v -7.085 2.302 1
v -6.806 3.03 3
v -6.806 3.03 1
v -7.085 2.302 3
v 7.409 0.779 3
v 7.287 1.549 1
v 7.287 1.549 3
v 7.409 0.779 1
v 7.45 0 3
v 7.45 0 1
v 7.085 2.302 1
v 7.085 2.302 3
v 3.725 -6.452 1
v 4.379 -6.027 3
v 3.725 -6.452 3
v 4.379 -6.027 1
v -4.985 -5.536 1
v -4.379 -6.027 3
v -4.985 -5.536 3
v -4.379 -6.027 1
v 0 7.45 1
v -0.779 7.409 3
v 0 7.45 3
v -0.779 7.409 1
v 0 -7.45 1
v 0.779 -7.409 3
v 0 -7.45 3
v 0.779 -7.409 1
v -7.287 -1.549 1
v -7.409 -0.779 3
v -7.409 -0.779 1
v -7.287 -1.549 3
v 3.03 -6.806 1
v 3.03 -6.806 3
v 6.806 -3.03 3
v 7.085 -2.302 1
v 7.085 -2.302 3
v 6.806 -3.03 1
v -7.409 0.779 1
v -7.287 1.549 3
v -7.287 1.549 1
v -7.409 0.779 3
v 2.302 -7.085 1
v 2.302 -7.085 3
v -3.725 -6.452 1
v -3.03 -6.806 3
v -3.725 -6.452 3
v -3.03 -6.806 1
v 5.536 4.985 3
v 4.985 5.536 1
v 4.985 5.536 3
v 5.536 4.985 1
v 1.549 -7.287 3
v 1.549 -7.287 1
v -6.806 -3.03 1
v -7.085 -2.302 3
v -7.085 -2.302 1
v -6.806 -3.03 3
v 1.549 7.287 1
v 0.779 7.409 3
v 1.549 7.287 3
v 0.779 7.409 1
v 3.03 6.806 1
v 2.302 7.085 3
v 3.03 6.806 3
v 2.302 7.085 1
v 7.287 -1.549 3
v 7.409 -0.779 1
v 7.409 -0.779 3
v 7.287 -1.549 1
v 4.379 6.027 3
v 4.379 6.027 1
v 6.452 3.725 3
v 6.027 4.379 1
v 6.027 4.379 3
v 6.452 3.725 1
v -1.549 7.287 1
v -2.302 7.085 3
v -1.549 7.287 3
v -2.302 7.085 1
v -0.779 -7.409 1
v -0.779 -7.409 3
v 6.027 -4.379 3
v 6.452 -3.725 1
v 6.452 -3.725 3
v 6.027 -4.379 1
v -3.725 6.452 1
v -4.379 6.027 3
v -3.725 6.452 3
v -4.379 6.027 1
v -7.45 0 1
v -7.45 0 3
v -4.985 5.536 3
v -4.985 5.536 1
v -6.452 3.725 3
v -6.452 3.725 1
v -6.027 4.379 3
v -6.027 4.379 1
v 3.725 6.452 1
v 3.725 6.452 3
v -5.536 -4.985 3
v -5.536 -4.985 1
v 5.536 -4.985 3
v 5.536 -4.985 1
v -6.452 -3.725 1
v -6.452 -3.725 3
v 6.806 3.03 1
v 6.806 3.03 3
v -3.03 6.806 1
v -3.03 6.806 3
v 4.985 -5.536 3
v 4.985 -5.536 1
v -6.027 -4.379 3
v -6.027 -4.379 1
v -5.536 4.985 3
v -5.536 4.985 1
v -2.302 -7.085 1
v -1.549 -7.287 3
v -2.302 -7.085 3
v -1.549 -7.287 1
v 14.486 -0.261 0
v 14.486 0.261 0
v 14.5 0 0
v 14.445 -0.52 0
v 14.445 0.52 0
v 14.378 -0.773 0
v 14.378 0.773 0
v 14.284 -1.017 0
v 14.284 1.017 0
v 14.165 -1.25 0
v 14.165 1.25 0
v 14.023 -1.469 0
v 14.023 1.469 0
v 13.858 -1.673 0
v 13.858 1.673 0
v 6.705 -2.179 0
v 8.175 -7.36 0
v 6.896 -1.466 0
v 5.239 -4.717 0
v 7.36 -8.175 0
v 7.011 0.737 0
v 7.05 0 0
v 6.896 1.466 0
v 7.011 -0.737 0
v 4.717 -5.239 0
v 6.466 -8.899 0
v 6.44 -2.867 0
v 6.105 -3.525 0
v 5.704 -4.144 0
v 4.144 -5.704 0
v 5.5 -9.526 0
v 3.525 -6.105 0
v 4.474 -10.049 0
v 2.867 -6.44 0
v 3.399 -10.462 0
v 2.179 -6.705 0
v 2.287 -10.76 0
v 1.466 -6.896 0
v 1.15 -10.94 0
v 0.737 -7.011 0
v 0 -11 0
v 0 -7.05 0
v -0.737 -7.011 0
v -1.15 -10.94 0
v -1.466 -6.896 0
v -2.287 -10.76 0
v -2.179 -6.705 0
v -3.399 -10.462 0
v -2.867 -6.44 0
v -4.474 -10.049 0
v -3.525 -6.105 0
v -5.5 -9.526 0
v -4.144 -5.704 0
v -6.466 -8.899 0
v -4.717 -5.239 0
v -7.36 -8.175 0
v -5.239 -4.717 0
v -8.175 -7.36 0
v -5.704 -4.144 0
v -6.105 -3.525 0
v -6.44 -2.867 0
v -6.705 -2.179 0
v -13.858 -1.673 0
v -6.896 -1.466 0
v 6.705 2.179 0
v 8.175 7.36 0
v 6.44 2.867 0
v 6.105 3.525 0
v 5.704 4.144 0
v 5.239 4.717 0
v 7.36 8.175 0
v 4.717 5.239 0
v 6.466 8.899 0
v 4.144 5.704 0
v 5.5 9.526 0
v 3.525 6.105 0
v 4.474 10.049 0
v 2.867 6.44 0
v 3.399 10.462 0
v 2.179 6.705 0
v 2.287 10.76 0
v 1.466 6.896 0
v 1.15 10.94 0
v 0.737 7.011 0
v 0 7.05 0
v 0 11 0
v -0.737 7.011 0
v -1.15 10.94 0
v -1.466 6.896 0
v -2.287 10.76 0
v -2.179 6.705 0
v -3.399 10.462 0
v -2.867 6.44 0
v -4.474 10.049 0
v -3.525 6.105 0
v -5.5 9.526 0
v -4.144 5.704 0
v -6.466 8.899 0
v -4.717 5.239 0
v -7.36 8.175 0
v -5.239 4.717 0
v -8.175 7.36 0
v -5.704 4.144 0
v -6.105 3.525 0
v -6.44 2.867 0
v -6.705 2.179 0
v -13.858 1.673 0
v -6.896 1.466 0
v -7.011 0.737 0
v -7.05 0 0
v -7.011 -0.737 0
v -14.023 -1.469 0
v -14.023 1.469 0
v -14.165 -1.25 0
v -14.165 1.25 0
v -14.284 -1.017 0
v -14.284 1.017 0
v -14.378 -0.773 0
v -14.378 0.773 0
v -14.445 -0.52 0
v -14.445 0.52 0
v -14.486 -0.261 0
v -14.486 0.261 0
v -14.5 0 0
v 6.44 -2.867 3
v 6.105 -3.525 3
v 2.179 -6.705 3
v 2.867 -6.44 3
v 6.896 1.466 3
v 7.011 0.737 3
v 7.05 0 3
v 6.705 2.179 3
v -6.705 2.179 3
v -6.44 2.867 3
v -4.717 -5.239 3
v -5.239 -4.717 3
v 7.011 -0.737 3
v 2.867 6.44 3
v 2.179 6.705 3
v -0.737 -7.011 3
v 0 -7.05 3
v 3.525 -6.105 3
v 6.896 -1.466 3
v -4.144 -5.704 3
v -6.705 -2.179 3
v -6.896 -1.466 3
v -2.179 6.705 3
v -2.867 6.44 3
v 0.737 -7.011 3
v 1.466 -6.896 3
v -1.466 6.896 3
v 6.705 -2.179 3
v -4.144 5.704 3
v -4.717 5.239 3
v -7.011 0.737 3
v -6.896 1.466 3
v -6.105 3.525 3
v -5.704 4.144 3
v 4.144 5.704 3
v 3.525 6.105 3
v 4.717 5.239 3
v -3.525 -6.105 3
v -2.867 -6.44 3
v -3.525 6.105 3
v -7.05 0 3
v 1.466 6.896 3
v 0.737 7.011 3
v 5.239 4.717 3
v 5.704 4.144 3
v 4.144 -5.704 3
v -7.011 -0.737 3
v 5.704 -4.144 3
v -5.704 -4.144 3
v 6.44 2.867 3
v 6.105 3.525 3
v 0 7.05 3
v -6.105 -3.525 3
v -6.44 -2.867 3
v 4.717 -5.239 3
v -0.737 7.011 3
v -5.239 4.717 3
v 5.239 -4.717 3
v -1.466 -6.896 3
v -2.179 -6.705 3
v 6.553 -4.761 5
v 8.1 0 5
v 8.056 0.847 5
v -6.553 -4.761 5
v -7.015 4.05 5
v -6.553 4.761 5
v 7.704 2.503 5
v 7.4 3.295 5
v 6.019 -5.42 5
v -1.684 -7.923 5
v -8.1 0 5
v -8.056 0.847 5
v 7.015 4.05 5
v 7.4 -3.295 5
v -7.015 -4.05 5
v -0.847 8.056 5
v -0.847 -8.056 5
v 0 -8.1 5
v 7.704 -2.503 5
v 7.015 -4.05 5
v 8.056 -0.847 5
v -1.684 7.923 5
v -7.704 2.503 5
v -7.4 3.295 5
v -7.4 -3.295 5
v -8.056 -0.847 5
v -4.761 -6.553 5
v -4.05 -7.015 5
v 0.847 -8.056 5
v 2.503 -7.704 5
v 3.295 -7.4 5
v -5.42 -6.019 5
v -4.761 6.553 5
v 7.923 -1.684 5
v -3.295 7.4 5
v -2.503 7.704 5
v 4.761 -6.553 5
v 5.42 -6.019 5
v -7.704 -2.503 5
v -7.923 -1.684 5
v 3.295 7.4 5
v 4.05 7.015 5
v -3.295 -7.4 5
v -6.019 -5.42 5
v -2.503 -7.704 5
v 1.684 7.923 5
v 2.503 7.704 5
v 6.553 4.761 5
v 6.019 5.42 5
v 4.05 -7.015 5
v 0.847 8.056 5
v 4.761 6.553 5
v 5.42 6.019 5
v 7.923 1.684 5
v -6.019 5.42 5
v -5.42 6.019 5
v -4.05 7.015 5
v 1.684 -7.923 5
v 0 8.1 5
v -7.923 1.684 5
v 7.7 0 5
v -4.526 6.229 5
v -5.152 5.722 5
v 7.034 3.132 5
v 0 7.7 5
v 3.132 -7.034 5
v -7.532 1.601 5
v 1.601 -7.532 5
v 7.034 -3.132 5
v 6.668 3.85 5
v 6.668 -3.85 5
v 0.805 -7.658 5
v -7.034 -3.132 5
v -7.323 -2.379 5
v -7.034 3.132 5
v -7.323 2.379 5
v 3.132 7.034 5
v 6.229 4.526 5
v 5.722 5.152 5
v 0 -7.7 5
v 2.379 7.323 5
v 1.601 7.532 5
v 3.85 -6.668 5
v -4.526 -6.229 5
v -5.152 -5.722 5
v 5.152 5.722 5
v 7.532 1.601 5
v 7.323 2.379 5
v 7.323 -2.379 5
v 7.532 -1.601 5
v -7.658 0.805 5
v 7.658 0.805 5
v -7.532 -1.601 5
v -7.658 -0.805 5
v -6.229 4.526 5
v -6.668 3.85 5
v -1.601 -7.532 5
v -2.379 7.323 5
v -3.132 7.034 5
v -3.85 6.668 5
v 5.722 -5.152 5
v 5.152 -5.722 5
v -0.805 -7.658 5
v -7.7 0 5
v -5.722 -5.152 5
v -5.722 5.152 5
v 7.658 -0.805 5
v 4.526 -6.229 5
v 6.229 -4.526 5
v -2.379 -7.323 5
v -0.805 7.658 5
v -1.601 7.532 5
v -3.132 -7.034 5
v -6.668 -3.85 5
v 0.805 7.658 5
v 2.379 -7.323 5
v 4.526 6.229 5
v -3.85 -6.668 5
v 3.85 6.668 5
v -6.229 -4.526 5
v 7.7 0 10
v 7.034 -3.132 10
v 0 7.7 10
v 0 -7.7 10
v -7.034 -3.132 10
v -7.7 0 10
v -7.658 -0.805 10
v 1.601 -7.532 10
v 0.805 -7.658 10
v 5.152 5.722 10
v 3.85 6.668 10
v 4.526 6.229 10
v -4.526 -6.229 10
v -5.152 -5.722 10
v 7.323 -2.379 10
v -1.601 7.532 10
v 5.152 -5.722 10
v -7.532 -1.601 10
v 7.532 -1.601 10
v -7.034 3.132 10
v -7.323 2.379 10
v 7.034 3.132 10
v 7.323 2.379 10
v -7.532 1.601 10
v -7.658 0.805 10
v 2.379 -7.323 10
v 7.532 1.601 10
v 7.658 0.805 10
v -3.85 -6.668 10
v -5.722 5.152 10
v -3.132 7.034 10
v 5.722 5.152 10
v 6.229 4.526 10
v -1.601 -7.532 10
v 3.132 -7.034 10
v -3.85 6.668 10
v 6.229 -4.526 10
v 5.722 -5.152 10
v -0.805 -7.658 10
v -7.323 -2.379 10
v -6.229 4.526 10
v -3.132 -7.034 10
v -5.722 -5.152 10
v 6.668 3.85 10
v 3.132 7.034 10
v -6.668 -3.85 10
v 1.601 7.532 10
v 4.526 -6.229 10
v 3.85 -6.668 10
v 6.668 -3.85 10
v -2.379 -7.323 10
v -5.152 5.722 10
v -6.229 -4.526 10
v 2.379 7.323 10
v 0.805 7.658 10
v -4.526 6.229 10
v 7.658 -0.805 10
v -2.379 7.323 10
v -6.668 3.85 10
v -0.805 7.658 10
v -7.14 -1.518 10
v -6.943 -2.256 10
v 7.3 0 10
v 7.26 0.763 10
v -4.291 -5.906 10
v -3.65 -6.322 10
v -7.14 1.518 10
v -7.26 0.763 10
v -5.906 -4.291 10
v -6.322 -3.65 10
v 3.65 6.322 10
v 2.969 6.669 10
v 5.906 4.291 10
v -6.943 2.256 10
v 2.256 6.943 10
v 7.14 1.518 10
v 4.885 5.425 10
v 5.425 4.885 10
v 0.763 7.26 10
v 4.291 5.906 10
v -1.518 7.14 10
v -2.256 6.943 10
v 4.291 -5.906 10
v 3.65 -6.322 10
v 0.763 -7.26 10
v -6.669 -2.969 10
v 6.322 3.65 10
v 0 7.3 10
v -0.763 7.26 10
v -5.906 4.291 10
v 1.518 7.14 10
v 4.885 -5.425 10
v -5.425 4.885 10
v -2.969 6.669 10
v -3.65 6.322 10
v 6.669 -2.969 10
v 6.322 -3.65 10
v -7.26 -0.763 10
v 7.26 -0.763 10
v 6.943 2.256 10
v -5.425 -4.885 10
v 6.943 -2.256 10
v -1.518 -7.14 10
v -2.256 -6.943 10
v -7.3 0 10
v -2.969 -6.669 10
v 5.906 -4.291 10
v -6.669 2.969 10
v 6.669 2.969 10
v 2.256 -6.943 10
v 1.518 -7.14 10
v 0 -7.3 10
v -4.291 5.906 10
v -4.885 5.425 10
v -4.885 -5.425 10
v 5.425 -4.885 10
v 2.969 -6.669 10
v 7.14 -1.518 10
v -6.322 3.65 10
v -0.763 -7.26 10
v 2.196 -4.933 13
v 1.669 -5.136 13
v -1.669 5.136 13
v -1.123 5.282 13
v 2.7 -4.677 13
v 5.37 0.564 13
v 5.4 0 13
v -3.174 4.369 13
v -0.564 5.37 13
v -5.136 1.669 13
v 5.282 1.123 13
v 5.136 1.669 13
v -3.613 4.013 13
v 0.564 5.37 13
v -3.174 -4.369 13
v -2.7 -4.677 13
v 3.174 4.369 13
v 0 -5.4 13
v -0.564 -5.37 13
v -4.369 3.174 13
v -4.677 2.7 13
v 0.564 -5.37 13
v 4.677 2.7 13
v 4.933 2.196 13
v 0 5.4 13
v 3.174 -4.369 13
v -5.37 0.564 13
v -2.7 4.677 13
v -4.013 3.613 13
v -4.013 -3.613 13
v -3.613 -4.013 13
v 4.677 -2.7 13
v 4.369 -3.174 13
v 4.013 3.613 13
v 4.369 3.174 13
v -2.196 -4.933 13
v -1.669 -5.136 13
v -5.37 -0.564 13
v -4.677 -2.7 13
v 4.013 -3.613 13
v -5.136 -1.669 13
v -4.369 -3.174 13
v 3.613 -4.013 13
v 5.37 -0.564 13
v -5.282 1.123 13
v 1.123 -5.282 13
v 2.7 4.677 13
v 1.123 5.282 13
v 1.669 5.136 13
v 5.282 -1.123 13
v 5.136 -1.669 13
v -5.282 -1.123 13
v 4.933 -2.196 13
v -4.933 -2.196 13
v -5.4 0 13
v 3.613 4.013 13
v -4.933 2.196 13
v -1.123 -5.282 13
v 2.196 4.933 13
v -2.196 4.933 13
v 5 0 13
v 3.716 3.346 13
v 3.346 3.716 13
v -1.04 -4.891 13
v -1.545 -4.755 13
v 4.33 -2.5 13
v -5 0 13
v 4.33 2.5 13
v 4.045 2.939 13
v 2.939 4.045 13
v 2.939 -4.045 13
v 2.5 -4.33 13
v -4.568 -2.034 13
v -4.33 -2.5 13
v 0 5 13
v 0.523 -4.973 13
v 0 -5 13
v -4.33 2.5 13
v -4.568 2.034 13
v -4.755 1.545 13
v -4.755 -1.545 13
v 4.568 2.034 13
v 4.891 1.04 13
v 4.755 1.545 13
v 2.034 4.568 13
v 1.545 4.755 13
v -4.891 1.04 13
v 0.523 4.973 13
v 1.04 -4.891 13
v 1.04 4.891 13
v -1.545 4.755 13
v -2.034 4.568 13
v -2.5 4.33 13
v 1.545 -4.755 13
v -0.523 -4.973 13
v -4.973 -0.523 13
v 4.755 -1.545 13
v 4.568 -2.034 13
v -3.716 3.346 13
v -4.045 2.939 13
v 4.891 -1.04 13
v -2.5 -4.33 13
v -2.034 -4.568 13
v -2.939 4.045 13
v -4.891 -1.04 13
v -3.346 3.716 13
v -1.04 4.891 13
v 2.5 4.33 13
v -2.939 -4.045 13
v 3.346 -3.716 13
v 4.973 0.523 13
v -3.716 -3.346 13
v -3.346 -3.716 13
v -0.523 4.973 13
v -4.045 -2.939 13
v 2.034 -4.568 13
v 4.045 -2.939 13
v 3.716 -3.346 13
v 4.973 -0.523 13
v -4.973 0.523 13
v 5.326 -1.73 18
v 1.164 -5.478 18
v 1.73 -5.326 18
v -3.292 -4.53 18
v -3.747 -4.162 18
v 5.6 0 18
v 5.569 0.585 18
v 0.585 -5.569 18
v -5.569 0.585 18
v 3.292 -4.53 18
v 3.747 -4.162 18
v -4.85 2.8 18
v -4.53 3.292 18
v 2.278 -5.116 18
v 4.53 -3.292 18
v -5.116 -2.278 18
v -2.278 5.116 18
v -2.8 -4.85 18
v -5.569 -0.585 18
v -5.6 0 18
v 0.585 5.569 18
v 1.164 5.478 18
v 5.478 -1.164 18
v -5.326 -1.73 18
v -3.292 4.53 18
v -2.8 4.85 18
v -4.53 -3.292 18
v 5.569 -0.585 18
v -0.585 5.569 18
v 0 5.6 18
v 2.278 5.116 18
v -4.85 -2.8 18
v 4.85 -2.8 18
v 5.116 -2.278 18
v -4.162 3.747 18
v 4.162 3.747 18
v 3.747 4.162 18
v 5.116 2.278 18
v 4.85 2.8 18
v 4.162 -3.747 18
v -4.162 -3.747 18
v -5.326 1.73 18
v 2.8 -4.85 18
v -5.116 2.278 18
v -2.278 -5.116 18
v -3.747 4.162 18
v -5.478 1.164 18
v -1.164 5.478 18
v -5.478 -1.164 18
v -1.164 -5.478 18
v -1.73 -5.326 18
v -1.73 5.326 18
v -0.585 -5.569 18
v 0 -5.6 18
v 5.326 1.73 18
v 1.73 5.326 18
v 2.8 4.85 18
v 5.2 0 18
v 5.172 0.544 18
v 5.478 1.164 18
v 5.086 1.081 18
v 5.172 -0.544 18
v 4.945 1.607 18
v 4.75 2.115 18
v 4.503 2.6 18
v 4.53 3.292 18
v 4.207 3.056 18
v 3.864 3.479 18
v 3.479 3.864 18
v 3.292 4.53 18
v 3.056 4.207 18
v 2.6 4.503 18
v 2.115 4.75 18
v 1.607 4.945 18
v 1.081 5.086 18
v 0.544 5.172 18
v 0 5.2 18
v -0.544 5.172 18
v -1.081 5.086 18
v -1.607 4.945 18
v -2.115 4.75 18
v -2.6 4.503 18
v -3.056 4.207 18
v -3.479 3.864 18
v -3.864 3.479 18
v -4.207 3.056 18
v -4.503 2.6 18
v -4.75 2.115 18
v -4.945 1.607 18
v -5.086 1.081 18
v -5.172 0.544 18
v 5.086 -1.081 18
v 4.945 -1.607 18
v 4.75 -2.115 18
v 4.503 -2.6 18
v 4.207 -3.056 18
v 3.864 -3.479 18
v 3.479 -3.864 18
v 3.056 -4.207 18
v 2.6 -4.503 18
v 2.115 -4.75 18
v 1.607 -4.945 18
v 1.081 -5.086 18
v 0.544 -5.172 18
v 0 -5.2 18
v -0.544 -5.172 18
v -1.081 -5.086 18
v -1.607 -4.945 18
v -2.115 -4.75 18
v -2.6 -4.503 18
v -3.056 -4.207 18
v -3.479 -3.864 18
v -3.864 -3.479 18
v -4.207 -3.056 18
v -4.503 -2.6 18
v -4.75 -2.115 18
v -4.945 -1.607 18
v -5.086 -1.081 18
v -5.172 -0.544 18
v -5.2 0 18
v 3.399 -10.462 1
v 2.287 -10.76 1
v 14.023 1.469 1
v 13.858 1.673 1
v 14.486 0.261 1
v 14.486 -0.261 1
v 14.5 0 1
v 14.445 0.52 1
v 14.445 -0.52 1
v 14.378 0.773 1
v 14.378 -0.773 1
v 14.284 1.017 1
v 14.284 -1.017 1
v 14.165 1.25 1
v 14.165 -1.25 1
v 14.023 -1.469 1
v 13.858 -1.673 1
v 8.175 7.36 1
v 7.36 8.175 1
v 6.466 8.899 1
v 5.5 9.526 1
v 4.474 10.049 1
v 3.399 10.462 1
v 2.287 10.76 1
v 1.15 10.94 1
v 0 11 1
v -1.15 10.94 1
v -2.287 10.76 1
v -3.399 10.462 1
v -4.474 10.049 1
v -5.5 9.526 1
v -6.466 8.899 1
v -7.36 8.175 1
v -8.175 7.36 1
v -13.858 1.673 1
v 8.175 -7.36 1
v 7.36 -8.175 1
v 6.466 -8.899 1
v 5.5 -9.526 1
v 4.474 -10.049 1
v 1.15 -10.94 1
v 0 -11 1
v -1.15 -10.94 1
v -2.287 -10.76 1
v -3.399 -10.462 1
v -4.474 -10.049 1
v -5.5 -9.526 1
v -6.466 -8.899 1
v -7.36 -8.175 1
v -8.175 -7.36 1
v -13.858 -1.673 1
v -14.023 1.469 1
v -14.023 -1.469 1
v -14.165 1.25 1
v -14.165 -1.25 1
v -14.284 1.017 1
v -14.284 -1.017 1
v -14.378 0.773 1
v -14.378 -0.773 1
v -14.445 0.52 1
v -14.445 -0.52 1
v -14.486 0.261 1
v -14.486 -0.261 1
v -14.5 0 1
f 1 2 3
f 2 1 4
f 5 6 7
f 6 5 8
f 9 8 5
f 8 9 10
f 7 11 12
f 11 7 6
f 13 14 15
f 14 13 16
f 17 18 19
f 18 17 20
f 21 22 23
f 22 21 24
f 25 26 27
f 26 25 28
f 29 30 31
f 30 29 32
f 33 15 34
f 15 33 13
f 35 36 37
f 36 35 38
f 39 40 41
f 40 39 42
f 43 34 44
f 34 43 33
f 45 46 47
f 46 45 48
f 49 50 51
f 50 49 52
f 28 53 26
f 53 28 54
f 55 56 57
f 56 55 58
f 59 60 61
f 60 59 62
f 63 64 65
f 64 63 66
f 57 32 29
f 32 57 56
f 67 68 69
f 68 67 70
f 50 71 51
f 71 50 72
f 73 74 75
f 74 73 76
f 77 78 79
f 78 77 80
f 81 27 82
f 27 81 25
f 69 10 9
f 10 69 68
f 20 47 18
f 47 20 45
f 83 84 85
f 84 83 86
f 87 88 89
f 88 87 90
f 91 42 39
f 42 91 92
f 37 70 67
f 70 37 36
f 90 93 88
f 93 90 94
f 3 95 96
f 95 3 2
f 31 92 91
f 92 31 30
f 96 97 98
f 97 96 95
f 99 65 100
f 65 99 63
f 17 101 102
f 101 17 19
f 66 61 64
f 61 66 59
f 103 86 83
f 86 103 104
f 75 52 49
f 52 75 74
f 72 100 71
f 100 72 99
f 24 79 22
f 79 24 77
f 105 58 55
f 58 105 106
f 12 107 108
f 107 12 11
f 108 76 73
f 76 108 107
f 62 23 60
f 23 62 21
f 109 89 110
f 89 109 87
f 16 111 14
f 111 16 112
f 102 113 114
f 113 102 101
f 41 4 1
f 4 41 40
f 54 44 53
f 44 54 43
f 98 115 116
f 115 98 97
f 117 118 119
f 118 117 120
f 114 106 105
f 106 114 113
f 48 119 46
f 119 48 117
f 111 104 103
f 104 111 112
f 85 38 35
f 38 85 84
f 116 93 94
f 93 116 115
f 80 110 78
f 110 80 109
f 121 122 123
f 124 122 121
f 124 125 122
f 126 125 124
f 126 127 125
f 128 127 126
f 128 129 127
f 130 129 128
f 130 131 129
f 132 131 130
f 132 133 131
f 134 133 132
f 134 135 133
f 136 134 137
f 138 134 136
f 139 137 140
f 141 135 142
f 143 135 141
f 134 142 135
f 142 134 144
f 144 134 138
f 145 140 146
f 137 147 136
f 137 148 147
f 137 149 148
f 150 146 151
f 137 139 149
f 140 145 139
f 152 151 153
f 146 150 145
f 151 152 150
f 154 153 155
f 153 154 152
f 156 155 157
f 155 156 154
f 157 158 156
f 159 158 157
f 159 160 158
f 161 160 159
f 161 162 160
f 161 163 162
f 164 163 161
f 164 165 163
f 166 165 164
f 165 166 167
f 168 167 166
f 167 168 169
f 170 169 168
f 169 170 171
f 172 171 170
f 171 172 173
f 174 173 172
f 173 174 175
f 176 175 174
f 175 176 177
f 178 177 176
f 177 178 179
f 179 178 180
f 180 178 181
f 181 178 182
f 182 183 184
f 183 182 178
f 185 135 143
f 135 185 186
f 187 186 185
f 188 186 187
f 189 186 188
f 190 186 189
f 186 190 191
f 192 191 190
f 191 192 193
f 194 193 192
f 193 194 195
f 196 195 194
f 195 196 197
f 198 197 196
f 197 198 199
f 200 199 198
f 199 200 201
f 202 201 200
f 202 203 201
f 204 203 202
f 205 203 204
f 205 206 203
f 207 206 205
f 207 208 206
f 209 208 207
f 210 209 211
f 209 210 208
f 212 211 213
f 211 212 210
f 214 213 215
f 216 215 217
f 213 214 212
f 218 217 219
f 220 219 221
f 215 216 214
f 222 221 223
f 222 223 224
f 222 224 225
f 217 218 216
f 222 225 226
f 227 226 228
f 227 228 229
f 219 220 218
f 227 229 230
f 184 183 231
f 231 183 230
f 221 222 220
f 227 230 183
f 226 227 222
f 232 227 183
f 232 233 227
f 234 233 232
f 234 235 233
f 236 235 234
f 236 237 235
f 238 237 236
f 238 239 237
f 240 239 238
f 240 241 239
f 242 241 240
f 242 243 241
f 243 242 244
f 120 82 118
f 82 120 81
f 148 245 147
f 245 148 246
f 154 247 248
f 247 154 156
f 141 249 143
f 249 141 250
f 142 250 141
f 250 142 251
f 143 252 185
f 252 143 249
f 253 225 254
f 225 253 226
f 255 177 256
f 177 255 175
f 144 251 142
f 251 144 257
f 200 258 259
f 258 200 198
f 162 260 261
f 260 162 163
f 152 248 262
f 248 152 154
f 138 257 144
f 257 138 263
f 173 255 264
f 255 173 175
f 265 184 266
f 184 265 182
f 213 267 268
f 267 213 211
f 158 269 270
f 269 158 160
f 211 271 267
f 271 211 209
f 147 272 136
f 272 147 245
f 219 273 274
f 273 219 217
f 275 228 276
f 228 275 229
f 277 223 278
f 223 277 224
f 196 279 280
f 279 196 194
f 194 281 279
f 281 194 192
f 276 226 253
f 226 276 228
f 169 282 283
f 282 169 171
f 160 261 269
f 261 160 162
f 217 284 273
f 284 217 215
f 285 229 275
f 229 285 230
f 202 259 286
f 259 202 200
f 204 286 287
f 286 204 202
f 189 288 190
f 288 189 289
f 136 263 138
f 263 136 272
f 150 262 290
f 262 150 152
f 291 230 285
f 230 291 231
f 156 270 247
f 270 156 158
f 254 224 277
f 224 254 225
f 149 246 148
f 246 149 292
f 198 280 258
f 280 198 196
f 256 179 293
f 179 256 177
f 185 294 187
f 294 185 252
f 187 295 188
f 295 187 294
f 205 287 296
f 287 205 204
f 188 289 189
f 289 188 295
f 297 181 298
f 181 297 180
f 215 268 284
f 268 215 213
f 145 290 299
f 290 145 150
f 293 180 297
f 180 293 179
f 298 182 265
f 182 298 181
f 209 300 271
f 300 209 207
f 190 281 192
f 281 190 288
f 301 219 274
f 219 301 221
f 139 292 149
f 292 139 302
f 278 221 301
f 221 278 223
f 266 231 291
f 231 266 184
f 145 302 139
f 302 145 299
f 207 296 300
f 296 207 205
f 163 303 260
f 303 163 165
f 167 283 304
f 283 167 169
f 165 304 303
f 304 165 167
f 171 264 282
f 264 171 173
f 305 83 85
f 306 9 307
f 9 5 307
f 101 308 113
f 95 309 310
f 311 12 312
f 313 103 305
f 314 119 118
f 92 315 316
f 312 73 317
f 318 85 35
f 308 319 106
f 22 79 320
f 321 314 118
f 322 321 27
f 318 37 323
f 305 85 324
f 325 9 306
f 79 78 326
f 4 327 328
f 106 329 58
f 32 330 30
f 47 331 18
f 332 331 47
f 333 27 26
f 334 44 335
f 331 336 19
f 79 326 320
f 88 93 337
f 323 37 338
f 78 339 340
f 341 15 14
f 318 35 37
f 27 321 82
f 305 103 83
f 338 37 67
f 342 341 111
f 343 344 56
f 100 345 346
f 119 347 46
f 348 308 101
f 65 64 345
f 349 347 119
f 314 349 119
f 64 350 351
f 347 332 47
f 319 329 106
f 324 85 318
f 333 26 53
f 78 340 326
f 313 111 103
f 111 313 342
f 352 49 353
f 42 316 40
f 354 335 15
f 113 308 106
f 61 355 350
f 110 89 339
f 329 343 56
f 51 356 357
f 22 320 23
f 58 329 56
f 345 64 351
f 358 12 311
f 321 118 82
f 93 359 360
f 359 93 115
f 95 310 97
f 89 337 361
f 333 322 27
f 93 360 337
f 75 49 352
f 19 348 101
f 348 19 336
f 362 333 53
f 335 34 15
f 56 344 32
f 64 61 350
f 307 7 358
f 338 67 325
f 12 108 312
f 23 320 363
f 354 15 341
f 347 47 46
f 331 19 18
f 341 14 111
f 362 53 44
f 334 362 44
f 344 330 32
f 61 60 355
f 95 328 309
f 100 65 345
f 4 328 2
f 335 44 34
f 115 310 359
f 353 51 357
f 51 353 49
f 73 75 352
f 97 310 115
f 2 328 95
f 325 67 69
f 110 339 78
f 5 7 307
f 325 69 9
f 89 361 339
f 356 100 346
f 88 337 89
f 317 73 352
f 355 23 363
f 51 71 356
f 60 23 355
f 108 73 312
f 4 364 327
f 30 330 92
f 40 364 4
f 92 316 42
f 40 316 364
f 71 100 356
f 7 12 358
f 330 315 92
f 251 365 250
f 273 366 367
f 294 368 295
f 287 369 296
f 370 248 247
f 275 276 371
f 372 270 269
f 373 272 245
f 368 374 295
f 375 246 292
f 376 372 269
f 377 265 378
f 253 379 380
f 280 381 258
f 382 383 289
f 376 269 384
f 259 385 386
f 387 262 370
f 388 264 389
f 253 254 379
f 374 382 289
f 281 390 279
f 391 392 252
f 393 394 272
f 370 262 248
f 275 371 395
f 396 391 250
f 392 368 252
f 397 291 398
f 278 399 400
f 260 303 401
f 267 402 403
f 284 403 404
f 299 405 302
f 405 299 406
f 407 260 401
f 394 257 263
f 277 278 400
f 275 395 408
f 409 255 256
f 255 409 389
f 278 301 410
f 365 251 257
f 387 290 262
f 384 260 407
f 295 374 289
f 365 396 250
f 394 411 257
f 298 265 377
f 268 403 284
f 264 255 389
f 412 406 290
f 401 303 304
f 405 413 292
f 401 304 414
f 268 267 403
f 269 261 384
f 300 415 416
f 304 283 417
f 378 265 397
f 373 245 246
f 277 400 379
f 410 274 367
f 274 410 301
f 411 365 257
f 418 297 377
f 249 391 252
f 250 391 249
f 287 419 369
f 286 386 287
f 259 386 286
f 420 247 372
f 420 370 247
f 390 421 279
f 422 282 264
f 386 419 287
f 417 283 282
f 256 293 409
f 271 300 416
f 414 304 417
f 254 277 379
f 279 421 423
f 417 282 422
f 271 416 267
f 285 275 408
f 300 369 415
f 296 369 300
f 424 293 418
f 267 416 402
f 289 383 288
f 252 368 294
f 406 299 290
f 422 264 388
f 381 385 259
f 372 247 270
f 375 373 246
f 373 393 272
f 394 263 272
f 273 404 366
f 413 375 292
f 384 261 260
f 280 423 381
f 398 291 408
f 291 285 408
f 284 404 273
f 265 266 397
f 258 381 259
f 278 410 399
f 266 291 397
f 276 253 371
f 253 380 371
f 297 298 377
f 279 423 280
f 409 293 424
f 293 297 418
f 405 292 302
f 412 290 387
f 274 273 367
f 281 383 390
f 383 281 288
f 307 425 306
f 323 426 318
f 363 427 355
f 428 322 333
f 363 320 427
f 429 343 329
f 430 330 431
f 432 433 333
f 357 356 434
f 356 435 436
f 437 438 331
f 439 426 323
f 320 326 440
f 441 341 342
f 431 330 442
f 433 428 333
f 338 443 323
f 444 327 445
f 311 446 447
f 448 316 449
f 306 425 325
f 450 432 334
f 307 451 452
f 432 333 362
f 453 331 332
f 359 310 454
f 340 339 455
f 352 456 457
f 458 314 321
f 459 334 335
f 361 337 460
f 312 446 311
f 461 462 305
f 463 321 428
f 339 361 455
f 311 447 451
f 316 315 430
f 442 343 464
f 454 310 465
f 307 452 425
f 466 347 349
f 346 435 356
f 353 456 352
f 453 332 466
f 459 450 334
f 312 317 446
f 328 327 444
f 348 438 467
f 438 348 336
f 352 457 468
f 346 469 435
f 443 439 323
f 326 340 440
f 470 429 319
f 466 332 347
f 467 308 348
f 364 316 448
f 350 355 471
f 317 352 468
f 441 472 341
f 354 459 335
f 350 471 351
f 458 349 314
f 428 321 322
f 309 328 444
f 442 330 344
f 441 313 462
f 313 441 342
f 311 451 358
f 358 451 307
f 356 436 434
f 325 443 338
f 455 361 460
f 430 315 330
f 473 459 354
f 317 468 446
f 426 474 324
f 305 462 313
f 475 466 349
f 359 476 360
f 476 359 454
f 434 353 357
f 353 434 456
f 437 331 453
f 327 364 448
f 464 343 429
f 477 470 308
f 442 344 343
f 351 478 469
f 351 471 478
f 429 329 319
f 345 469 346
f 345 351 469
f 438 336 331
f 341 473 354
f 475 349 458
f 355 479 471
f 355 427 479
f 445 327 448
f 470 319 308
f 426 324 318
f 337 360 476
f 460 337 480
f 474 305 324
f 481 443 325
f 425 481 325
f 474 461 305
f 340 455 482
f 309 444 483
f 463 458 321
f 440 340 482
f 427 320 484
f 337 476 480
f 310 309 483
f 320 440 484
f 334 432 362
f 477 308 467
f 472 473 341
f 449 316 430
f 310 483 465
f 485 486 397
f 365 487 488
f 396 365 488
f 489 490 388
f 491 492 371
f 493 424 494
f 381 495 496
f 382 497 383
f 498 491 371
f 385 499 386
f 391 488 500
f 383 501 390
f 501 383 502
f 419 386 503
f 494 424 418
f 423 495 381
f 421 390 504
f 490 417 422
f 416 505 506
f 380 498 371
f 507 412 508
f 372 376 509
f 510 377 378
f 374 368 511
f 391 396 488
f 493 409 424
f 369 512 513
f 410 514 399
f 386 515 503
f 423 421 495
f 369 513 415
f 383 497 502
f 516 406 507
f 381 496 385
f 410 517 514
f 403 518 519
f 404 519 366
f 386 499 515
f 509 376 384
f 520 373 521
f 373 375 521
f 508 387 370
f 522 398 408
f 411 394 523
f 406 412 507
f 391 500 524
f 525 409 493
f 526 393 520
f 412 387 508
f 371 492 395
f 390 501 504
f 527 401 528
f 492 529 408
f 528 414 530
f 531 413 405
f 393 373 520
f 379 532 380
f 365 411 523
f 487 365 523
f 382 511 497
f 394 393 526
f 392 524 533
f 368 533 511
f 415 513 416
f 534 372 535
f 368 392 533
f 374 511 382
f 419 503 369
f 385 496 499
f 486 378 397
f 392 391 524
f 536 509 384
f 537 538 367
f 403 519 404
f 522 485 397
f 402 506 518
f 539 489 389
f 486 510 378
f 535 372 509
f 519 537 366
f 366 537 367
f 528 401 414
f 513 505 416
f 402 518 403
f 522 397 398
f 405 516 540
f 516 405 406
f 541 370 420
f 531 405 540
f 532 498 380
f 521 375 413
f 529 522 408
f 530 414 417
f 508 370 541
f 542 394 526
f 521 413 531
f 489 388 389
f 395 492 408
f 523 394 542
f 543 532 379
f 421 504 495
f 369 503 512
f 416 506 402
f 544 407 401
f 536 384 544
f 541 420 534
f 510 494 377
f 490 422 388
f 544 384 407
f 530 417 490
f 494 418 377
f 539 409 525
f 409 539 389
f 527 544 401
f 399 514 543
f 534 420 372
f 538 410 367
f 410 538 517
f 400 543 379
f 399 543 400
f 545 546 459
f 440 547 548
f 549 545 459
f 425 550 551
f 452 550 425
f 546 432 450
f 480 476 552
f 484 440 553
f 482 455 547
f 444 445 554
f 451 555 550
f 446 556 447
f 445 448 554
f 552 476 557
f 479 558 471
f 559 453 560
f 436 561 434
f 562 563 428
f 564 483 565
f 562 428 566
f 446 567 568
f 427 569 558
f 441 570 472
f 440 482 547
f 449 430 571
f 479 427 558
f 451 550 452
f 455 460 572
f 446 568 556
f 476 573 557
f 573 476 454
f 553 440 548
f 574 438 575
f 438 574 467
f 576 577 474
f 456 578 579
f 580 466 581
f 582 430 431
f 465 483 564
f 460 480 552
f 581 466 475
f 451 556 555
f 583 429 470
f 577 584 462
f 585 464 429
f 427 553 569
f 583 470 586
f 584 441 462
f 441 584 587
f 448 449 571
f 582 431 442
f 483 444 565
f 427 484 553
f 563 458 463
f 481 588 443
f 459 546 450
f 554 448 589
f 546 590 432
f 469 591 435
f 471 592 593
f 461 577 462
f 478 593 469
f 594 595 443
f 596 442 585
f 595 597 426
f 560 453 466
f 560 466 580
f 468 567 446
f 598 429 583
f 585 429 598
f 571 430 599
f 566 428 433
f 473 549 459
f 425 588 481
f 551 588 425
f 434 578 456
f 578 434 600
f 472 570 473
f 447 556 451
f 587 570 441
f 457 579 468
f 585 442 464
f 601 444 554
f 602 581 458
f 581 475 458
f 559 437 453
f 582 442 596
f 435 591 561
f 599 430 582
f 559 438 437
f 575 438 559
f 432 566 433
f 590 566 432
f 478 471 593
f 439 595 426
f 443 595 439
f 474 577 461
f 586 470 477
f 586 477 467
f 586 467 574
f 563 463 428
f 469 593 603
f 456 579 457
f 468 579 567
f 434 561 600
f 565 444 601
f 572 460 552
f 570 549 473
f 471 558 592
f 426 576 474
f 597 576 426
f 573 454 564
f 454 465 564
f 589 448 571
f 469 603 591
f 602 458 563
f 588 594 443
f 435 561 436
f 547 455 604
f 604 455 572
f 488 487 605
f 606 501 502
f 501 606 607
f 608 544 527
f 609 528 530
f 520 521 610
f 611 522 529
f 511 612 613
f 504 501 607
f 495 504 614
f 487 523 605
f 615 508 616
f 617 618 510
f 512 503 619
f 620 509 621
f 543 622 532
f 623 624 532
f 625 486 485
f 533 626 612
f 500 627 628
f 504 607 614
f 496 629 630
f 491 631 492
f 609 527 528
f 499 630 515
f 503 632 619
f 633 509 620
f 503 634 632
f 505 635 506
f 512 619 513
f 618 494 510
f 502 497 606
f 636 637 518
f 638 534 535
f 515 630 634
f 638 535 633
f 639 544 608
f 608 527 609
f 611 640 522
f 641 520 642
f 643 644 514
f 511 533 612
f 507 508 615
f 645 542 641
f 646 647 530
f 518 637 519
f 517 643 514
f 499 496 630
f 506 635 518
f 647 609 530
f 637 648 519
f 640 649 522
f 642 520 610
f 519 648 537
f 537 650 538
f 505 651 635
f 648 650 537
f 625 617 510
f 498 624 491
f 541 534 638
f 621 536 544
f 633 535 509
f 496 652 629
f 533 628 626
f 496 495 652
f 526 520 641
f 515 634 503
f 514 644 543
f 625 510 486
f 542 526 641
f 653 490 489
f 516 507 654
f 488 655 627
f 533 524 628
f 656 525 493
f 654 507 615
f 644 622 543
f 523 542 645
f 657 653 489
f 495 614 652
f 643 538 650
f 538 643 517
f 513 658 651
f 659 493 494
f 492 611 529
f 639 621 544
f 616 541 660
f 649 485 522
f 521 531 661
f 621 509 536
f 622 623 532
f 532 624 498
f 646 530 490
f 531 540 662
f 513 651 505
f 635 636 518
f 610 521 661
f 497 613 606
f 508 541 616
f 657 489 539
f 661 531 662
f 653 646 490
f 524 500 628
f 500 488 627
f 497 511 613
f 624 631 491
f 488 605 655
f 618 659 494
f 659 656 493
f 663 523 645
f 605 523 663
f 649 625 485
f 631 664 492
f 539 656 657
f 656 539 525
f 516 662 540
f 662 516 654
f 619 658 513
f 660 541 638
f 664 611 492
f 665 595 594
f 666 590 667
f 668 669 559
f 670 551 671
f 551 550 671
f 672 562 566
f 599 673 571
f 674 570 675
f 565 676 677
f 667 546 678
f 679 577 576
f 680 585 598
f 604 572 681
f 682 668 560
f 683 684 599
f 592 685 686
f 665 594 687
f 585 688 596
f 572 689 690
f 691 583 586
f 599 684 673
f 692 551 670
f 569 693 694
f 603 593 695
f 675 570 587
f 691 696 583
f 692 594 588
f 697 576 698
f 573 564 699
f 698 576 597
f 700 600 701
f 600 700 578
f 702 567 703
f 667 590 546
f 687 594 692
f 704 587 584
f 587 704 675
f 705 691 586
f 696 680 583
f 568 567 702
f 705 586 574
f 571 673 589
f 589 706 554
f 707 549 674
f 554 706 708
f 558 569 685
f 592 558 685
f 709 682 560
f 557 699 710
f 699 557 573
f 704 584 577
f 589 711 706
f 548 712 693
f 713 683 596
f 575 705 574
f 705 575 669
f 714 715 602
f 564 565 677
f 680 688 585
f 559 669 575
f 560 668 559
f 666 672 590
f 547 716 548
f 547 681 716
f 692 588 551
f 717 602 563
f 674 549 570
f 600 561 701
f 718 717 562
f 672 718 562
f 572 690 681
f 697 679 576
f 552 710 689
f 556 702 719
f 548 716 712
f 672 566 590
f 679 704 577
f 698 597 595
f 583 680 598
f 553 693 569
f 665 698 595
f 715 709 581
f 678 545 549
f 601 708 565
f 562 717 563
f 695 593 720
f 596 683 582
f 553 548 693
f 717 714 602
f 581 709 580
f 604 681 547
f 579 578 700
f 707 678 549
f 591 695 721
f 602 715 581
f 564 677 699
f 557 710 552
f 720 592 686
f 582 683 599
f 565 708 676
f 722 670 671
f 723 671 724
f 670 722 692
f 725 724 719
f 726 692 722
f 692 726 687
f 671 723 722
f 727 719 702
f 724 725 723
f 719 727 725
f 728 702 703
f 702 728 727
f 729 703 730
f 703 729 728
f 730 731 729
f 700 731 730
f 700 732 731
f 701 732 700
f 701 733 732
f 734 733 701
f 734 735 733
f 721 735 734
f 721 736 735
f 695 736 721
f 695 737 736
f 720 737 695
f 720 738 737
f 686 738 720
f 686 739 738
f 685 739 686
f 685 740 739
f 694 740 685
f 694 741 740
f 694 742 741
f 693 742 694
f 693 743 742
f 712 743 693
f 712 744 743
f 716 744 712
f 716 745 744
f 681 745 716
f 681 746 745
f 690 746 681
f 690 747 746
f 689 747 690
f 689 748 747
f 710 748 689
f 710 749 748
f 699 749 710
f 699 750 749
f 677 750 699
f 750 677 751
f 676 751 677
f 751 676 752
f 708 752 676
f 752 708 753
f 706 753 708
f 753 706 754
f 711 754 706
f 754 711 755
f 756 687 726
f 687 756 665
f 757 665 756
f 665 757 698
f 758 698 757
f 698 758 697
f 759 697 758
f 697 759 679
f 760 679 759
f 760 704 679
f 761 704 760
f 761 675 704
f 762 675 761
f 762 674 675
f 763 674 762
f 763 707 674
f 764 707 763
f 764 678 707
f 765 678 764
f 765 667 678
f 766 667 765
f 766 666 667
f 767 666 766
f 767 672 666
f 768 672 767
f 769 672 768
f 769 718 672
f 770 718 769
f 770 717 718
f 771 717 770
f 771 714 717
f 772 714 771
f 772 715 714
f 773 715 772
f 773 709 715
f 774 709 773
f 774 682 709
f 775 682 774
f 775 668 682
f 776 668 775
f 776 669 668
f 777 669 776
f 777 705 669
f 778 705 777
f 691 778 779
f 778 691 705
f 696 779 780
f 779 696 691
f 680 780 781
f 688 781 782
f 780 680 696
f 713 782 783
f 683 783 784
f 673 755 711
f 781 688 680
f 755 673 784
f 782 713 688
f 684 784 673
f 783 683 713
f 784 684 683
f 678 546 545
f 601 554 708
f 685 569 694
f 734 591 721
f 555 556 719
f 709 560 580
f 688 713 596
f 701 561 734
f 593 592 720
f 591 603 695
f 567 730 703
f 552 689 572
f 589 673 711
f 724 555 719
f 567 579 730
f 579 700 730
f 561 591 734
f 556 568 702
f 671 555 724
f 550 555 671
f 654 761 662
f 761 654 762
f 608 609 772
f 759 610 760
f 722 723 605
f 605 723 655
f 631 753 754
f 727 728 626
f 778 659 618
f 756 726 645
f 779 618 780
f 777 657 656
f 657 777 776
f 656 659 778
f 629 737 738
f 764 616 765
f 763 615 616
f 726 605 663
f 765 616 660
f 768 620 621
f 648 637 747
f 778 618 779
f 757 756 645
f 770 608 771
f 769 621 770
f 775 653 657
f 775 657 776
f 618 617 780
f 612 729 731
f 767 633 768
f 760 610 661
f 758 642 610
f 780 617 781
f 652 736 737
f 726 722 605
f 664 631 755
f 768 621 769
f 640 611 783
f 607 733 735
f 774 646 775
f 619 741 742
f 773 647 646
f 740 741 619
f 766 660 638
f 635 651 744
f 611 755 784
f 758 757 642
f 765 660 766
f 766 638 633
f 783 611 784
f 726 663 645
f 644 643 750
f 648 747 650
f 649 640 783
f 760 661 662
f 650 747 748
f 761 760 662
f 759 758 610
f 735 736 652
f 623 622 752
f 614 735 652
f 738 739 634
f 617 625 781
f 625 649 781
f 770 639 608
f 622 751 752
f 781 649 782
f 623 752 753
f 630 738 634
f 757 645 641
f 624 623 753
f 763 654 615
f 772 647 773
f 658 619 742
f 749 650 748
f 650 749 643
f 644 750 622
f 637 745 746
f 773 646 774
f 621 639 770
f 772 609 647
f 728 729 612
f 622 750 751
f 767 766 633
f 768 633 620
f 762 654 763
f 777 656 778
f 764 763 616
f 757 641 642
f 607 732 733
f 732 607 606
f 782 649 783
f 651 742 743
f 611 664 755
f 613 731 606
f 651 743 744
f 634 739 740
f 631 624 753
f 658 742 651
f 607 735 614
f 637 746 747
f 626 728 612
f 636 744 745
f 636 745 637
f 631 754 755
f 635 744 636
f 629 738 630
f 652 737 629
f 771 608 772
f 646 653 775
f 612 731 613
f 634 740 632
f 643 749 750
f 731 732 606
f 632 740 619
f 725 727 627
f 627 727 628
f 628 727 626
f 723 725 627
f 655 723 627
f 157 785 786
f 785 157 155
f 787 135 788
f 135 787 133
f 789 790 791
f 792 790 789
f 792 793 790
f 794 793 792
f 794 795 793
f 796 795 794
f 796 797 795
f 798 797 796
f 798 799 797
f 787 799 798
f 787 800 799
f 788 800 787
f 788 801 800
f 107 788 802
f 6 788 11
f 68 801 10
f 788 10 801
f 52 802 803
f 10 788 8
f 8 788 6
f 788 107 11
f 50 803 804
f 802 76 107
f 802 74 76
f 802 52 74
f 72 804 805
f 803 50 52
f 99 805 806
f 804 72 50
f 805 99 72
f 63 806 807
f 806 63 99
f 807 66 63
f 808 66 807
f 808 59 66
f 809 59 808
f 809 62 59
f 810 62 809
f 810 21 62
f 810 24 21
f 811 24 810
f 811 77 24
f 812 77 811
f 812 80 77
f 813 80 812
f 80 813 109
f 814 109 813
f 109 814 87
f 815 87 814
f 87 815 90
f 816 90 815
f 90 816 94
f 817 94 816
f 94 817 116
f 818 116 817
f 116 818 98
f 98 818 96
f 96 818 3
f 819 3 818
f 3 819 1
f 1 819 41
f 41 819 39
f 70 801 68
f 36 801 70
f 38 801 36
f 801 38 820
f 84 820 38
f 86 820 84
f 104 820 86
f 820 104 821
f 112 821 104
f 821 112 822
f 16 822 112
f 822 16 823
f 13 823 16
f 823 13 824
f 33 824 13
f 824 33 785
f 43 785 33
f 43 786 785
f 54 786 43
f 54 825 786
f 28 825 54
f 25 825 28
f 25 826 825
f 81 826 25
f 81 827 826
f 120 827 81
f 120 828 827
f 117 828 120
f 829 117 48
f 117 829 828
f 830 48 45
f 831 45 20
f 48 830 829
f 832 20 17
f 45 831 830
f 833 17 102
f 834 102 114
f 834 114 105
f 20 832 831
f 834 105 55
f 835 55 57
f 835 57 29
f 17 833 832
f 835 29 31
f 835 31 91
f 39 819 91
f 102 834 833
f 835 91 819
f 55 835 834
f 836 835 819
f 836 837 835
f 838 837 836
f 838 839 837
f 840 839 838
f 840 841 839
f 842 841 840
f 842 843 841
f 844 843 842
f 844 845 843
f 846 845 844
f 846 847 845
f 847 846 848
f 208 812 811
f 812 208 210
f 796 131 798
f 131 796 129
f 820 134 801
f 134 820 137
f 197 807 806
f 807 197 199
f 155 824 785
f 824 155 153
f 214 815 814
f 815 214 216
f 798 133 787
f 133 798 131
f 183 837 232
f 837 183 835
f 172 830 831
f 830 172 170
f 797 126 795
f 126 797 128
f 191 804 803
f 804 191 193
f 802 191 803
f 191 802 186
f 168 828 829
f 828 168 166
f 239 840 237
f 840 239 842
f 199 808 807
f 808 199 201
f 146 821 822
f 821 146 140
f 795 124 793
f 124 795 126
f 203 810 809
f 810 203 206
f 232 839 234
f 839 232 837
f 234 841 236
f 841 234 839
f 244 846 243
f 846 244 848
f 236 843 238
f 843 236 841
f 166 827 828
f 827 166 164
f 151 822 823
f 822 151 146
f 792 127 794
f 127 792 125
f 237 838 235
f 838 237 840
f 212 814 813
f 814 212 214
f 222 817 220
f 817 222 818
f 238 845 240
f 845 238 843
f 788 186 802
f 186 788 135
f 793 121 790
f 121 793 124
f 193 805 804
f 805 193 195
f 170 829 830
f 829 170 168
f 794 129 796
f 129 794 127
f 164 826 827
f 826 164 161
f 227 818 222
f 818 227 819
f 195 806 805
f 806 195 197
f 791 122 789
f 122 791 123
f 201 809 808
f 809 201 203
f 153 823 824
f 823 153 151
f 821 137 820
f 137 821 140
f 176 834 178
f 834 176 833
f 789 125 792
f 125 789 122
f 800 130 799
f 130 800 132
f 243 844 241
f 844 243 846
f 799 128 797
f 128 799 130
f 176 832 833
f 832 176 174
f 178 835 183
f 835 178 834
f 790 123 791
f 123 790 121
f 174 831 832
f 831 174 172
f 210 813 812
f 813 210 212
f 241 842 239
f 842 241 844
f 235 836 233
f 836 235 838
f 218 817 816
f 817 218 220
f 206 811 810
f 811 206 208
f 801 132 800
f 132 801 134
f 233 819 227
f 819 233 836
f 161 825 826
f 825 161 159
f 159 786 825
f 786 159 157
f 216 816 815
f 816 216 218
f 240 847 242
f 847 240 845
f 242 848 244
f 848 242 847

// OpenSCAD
// Outside radius to fit cage
outside_radius =  15.8;
// Inside radius to fit the plug
inside_radius = 14.1;
// Cup size
cupsize = 10.0;

/* [Hidden] */
heit = 13.0;
heit1 = 10.0;
heit2 = 3.0;
heit3 = 5.0;
$fn = 60;

module try3()
{
    translate([0,0,0])
    difference()
    {
        cylinder(r=inside_radius/2+.4,h=3);
        cylinder(r=inside_radius/2,h=3);
    }
    translate([0,0,3])
    difference()
    {
        cylinder(r1=inside_radius/2+.4,r2=outside_radius/2+.2,h=2);
        cylinder(r1=inside_radius/2,r2=outside_radius/2-.2,h=2);
    }
    translate([0,0,5])
    difference()
    {
        cylinder(r1=outside_radius/2+.2,r2=outside_radius/2-.2,h=5);
        cylinder(r1=outside_radius/2-.2,r2=outside_radius/2-.6,h=5);
    }
    
    translate([0,0,heit1])
        difference()
        {
            cylinder(r1=outside_radius/2-.2,r2=cupsize/2+.4,h=heit2);
            cylinder(r1=outside_radius/2-.6,r2=cupsize/2,h=heit2);
        }
    translate([0,0,heit1+heit2])
    difference()
    {
        cylinder(r1=cupsize/2+.4,r2=cupsize/2+.6,h=heit3);
        cylinder(r1=cupsize/2,r2=cupsize/2+.2,h=heit3);
    }
    difference()
    {
        hull()
        {
            cylinder(r=22/2,h=1);
            translate([29/2-2.5,0,0])
                cylinder(r=2.5,h=1);
            translate([-29/2+2.5,0,0])
                cylinder(r=2.5,h=1);
        }
        cylinder(r=inside_radius/2+.4,1);
    }

}


try3();
